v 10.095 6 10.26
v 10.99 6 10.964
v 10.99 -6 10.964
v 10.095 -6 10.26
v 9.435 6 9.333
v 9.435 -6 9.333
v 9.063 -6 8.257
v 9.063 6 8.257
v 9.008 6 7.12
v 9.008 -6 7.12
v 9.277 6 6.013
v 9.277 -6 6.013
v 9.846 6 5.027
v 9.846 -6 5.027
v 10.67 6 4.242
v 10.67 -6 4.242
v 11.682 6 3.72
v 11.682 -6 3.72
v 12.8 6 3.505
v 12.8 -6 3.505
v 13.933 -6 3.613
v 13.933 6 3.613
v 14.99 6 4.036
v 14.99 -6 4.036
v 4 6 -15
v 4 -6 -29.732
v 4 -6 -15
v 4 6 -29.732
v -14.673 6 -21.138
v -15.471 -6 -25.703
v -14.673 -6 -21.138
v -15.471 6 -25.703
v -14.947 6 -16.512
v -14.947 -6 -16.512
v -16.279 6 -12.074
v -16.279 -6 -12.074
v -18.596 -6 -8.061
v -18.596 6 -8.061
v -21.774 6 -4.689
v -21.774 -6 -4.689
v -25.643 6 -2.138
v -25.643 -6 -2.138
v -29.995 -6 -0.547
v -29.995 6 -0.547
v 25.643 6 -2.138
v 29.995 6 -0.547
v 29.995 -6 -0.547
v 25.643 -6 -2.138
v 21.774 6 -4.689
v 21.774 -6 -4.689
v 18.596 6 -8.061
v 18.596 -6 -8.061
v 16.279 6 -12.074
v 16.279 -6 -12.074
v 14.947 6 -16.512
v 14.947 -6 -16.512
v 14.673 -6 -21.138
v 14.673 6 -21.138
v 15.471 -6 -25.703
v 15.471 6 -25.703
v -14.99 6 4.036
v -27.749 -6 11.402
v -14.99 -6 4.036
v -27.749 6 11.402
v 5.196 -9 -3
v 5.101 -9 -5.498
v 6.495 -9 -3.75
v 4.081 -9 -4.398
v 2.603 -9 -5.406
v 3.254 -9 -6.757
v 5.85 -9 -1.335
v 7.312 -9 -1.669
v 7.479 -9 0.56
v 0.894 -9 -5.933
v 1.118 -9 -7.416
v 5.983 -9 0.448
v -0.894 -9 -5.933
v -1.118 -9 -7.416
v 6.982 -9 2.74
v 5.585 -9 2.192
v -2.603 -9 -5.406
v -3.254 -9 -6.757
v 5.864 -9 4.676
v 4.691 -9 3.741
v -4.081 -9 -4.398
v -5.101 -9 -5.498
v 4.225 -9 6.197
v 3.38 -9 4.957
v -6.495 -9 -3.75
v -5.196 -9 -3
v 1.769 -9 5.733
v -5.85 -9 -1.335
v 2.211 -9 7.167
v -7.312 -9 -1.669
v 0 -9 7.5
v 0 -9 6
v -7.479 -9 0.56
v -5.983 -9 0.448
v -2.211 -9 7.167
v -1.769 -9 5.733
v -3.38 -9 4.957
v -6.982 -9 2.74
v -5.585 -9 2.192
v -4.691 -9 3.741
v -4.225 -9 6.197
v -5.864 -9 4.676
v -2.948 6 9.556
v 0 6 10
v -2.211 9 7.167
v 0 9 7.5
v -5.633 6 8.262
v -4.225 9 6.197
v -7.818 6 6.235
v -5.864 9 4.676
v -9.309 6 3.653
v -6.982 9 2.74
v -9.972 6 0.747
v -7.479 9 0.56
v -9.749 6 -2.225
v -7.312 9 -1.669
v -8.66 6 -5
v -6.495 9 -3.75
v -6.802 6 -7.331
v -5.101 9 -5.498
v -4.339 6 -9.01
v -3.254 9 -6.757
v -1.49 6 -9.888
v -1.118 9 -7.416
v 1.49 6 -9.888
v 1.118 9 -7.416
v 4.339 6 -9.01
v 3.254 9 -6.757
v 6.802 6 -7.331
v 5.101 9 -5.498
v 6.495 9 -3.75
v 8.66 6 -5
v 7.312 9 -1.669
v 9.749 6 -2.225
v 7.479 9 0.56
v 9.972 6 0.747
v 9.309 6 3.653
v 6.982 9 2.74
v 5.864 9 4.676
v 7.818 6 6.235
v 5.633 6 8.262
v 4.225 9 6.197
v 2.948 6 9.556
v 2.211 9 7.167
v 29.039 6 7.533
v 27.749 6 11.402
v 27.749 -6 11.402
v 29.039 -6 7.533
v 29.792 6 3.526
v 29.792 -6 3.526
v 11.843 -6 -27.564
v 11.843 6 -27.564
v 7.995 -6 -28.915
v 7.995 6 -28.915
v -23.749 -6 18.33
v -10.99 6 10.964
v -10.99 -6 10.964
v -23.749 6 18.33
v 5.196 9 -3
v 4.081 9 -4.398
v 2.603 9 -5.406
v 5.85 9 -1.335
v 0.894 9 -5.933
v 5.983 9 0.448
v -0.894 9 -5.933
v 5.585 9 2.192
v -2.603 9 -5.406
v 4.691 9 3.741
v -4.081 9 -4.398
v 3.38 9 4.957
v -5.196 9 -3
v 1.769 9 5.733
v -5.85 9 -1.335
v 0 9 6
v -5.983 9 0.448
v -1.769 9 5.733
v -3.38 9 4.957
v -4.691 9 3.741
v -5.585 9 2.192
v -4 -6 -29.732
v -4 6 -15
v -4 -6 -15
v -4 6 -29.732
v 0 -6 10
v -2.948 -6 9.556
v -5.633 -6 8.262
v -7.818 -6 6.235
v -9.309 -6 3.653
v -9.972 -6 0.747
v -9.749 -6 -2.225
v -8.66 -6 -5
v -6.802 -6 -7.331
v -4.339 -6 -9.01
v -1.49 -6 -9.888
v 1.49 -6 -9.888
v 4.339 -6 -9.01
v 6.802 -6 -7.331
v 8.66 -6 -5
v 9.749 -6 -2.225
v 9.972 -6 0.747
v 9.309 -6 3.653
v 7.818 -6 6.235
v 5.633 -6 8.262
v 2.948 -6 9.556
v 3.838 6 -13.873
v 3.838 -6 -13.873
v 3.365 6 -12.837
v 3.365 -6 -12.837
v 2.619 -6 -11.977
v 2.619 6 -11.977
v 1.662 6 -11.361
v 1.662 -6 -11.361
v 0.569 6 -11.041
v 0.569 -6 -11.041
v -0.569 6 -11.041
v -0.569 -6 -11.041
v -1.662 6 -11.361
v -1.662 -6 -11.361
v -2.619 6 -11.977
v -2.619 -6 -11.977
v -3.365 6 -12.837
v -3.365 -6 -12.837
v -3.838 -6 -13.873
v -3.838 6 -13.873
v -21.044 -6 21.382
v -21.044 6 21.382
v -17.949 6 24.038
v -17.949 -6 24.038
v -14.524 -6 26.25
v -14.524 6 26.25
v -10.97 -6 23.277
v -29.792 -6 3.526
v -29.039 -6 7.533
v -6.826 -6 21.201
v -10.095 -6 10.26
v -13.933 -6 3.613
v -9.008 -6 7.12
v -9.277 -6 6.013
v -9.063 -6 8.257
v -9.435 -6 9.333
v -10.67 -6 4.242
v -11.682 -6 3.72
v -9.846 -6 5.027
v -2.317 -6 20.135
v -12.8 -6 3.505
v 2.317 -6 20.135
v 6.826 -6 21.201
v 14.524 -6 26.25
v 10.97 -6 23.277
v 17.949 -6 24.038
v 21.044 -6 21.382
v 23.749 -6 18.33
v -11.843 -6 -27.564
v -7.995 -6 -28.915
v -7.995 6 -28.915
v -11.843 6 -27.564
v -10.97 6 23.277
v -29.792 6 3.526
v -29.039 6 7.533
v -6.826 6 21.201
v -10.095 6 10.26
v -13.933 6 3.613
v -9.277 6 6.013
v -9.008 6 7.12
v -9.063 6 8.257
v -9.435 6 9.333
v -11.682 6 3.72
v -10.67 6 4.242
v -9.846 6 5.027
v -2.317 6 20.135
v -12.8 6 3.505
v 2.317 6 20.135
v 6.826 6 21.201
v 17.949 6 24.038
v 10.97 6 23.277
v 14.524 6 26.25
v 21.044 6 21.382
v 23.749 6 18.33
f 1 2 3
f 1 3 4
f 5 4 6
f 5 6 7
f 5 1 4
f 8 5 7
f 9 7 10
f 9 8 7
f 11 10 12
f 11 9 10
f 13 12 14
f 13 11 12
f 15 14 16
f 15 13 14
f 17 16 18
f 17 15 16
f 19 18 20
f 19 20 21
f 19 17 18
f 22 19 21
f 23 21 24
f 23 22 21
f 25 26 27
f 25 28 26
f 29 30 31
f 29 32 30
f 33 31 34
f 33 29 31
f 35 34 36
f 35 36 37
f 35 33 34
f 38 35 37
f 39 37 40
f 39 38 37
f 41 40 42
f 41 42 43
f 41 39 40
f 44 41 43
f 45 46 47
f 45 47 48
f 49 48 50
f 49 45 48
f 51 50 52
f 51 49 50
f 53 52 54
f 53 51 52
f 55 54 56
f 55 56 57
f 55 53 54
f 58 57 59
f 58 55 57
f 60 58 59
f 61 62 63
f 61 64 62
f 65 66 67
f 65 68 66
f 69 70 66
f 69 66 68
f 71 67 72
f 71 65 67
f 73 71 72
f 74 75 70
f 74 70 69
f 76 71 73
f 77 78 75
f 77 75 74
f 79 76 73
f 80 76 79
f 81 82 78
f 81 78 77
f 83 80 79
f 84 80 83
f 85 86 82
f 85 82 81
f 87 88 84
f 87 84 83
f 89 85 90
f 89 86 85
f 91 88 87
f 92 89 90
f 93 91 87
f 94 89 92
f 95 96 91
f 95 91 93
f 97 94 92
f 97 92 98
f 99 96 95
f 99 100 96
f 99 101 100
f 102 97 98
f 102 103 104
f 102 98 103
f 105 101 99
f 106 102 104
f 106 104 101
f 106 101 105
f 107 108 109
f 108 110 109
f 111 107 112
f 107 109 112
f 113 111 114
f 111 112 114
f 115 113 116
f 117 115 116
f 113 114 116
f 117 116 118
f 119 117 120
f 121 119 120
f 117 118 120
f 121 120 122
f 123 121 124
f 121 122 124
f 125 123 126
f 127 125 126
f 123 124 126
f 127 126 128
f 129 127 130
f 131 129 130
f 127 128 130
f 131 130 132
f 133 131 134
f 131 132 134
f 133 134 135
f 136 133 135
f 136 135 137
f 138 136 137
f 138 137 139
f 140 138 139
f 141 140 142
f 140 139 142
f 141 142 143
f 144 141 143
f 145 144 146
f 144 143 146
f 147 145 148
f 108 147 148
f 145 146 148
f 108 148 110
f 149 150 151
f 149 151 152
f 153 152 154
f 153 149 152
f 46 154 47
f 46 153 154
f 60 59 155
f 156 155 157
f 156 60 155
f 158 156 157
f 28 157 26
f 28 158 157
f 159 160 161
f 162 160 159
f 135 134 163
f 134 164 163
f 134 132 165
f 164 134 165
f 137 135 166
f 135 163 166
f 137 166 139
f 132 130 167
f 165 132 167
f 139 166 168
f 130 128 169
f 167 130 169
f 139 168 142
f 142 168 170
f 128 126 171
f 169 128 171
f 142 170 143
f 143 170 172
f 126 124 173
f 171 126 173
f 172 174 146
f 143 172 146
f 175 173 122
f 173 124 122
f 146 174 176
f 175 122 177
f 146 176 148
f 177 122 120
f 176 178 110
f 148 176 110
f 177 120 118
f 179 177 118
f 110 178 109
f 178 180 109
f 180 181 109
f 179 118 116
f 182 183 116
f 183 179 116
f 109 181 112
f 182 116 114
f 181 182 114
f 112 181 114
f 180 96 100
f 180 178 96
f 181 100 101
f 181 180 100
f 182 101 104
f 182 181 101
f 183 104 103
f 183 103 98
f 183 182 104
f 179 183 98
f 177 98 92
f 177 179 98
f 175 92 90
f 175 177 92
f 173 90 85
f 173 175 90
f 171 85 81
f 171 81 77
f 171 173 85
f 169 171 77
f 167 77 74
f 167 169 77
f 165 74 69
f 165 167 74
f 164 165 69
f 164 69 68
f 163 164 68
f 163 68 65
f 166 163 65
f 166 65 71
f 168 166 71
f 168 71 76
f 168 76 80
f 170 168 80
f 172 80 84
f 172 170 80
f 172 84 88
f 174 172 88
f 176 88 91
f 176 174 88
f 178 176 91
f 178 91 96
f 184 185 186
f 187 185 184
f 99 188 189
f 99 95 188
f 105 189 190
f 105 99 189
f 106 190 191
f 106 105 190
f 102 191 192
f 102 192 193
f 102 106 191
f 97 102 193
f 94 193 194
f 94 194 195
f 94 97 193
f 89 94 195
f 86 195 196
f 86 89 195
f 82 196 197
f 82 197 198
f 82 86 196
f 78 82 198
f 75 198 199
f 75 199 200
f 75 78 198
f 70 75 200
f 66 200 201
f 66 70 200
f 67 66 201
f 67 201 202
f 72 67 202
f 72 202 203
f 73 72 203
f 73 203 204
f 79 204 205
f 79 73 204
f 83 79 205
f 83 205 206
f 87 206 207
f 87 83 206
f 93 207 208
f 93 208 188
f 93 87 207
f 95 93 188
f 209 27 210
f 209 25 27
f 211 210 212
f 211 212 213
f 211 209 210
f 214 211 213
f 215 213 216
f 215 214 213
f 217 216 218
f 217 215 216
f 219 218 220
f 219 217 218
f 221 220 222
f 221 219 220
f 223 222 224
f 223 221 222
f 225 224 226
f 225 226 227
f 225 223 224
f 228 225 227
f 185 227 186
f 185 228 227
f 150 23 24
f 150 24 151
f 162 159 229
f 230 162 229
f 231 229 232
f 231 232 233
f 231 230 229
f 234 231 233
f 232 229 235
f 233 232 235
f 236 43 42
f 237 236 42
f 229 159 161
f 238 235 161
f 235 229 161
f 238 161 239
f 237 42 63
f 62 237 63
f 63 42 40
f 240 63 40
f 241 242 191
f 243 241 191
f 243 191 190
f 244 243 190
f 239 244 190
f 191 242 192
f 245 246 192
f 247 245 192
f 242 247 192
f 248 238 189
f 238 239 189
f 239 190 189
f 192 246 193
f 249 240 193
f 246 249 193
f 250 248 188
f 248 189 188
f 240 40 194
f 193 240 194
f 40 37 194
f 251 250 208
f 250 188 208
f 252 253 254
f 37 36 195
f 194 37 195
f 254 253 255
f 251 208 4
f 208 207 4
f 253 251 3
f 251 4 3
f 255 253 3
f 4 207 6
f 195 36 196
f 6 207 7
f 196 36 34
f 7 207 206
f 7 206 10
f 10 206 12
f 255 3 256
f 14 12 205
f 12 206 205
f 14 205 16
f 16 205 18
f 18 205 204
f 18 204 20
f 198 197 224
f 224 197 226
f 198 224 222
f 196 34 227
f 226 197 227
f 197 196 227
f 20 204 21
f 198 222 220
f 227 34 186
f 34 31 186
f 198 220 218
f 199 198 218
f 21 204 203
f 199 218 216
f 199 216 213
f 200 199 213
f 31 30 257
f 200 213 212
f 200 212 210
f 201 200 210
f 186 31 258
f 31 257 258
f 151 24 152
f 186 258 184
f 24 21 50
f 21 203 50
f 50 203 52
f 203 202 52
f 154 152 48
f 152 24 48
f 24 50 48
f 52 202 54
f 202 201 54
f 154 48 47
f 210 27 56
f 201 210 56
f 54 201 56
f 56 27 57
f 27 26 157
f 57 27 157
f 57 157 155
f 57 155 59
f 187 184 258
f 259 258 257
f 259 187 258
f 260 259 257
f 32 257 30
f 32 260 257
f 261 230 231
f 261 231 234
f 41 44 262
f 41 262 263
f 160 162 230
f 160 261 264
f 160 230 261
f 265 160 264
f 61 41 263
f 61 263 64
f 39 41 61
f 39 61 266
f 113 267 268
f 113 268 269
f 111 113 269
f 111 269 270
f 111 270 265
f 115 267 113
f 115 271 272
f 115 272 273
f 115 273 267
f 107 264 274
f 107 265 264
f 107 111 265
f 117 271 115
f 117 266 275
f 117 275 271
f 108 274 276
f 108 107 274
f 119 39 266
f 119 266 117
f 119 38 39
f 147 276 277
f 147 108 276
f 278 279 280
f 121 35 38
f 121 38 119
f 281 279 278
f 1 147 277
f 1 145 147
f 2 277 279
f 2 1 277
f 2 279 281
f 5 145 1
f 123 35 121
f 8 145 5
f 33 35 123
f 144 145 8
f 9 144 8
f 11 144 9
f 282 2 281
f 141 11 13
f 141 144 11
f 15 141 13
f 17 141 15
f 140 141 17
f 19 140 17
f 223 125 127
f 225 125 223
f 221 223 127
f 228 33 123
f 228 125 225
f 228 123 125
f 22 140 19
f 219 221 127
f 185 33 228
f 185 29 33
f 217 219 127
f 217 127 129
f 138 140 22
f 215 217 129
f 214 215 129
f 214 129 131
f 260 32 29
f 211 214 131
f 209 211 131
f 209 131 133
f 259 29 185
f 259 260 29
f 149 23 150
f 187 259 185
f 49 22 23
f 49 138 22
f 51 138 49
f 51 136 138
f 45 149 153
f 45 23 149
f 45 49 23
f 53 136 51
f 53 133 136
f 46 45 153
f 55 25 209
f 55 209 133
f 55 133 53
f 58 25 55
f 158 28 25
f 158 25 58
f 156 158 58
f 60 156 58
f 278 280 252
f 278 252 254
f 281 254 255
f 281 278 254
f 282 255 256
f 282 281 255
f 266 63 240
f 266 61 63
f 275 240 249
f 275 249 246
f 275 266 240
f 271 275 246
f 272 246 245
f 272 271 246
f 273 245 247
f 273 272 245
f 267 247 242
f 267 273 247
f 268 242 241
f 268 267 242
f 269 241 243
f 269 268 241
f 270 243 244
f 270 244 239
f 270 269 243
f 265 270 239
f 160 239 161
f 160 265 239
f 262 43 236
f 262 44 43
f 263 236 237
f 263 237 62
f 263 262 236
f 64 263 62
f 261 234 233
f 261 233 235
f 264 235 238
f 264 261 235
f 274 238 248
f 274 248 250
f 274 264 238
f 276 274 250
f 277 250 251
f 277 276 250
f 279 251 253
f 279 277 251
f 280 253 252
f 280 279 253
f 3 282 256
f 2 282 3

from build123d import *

# Parameters (mm, degrees)
SKETCH_1_R      = 6
EXTRUDE_2_DEPTH = 6


with BuildPart() as part:
    # 草图1 → 凸台-拉伸2 (new, symmetric)
    with BuildSketch(Plane(origin=(0, 0, 0), x_dir=(1, 0, 0), z_dir=(0, 1, 0))):
        with BuildLine():
            Line((-10.990381057, -10.964101615), (-23.748786379, -18.330170362))
            ThreePointArc((-23.748786379, -18.330170362), (-19.541660382, -22.76232654), (-14.523687548, -26.25))
            ThreePointArc((-14.523687548, -26.25), (0, -20), (14.523687548, -26.25))
            ThreePointArc((14.523687548, -26.25), (19.541660382, -22.76232654), (23.748786379, -18.330170362))
            Line((23.748786379, -18.330170362), (10.990381057, -10.964101615))
            ThreePointArc((10.990381057, -10.964101615), (9.526279442, -5.5), (14.990381057, -4.035898385))
            Line((14.990381057, -4.035898385), (27.748786379, -11.401967132))
            ThreePointArc((27.748786379, -11.401967132), (29.483583224, -5.542411054), (29.995010623, 0.547117627))
            ThreePointArc((29.995010623, 0.547117627), (17.320508076, 10), (15.471323075, 25.702882373))
            ThreePointArc((15.471323075, 25.702882373), (9.941922841, 28.304737593), (4, 29.732137495))
            Line((4, 29.732137495), (4, 15))
            ThreePointArc((4, 15), (0, 11), (-4, 15))
            Line((-4, 15), (-4, 29.732137495))
            ThreePointArc((-4, 29.732137495), (-9.941922841, 28.304737593), (-15.471323075, 25.702882373))
            ThreePointArc((-15.471323075, 25.702882373), (-17.320508076, 10), (-29.995010623, 0.547117627))
            ThreePointArc((-29.995010623, 0.547117627), (-29.483583224, -5.542411054), (-27.748786379, -11.401967132))
            Line((-27.748786379, -11.401967132), (-14.990381057, -4.035898385))
            ThreePointArc((-14.990381057, -4.035898385), (-9.526279442, -5.5), (-10.990381057, -10.964101615))
        make_face()
        with Locations(Location((0, 0, 0), (0, 0, 270))):
            Circle(SKETCH_1_R, mode=Mode.SUBTRACT)
    extrude(amount=EXTRUDE_2_DEPTH, both=True)

    # 草图3 → 旋转2 (revolve)
    with BuildSketch(Plane(origin=(0, 0, 0), x_dir=(0, 0, -1), z_dir=(1, 0, 0))):
        Polygon((-10, 6), (-7.5, 9), (-6, 9), (-6, 6), align=None)
    revolve_2 = revolve(axis=Axis((0, 16.131008677, 0), (0, -1, 0)))

    # 镜向2: 旋转2 across plane
    add(revolve_2.mirror(Plane.ZX))


solid = part.part
